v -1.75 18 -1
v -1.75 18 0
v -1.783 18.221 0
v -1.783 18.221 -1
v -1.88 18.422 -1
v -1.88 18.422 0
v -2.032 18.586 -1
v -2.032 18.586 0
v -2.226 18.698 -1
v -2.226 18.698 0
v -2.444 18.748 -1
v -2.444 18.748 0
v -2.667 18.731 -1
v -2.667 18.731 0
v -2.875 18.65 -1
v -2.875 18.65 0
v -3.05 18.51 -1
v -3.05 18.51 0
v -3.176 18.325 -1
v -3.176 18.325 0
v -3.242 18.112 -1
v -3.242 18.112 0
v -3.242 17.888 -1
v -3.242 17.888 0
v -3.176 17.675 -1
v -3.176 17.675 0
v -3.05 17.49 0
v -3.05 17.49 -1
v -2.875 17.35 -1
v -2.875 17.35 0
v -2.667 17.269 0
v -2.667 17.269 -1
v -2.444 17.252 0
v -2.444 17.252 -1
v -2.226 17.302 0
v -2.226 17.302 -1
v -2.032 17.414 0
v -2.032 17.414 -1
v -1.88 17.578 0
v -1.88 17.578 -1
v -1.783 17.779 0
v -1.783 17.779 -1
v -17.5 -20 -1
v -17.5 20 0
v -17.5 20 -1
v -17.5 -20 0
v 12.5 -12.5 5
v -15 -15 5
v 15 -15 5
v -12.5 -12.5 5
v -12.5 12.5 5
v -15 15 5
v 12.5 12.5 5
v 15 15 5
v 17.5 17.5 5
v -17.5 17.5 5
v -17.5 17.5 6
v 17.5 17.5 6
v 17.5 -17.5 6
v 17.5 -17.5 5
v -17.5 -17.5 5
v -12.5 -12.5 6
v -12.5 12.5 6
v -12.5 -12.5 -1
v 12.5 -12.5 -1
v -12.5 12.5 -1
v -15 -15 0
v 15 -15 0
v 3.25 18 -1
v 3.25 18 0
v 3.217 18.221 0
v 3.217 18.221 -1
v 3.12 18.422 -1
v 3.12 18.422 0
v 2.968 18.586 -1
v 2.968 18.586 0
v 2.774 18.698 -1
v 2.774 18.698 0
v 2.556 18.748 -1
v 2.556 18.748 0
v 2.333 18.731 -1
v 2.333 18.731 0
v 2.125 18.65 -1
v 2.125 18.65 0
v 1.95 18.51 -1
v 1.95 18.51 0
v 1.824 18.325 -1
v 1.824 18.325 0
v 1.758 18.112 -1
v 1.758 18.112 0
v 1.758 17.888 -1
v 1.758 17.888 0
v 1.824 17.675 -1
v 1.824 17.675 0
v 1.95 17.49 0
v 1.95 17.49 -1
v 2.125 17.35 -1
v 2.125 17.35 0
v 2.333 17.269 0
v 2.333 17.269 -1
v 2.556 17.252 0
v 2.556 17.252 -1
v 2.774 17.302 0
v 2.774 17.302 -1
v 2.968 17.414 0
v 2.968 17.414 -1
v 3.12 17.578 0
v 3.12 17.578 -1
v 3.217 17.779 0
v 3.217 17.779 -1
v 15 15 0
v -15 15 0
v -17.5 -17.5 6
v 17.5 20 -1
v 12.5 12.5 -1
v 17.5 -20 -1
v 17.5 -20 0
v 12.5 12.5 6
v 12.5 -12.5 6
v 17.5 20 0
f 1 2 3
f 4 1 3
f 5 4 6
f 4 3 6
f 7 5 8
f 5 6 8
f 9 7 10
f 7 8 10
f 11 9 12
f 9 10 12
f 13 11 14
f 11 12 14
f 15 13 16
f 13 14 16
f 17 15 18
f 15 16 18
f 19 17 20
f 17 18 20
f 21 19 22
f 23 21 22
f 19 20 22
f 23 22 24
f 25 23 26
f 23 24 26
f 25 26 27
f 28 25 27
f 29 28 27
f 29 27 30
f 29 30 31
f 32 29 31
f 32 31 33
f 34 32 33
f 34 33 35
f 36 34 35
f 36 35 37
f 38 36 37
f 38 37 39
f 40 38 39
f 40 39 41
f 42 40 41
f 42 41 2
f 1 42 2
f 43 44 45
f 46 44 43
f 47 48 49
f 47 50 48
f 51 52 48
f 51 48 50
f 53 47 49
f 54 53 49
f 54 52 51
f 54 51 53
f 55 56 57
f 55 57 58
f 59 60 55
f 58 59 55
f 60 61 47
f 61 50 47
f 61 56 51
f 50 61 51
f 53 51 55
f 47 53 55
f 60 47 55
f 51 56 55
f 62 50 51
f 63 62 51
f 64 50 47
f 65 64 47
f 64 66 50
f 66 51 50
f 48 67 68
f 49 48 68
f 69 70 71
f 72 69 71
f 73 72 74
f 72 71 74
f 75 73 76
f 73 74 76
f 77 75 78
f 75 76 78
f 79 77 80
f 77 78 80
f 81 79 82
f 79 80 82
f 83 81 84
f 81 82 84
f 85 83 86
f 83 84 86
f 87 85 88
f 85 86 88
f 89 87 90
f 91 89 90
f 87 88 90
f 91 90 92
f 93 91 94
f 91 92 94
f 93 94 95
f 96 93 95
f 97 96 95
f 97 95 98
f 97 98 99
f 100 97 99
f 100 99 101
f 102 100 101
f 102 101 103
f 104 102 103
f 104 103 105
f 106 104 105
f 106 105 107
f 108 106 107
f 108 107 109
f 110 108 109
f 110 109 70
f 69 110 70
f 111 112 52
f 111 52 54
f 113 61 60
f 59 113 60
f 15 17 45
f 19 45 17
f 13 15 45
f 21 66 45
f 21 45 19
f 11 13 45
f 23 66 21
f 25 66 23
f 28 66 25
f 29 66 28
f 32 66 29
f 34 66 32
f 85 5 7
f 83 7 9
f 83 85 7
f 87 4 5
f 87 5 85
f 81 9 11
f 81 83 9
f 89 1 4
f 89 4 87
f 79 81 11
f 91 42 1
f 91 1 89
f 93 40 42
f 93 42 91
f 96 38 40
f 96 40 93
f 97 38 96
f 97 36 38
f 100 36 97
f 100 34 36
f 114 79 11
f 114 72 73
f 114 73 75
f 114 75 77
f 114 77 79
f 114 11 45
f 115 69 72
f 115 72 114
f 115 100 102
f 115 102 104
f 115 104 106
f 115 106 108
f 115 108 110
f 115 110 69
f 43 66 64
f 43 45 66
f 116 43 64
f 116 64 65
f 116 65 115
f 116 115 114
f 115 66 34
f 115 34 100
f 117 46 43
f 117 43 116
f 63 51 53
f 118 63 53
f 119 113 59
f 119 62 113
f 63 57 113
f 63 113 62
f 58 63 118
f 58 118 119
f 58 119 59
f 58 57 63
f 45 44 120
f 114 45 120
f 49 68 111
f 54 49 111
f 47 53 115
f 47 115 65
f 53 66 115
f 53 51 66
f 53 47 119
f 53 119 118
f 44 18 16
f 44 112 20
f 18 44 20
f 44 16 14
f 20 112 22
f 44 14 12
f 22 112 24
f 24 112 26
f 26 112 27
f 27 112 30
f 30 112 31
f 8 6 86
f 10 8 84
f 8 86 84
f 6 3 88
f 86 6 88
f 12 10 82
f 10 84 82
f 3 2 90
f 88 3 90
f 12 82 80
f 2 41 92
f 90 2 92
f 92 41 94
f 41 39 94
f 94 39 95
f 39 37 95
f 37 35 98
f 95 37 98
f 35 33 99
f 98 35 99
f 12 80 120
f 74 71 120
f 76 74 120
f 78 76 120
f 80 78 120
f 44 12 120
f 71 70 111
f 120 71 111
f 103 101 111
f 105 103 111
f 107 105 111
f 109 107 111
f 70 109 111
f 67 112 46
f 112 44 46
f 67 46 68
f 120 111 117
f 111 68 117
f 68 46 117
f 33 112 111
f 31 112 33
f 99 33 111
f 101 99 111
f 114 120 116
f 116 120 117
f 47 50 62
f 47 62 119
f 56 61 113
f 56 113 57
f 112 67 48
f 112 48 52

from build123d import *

# Parameters (mm, degrees)
F0_W     = 30
F0_H     = 30
F0_W_2   = 25
F0_H_2   = 25
F1_DEPTH = 5
F2_W     = 35
F2_H     = 35
F2_W_2   = 30
F2_H_2   = 30
F2_W_3   = 25
F2_H_3   = 25
F3_DEPTH = 1
F4_W     = 35
F4_H     = 40
F4_W_2   = 30
F4_H_2   = 30
F4_W_3   = 25
F4_H_3   = 25
F5_DEPTH = 1
F6_R     = 0.75
F7_DEPTH = 1.001


with BuildPart() as f1:
    # F0 (on Top) → F1 (new body)
    with BuildSketch(Plane.XY):
        Rectangle(F0_W, F0_H)
        Rectangle(F0_W_2, F0_H_2, mode=Mode.SUBTRACT)
    extrude(amount=F1_DEPTH)

    # F4 (on face) → F5 (join)
    with BuildSketch(Plane(origin=(0, 0, 0), x_dir=(1, 0, 0), z_dir=(0, 0, -1))):
        Rectangle(F4_W, F4_H)
        Rectangle(F4_W_2, F4_H_2, mode=Mode.SUBTRACT)
        Rectangle(F4_W_2, F4_H_2)
        Rectangle(F4_W_3, F4_H_3, mode=Mode.SUBTRACT)
    extrude(amount=F5_DEPTH)

    # F6 (on face) → F7 (cut, through all)
    with BuildSketch(Plane.XY):
        with Locations((-2.5, 18)):
            Circle(F6_R)
        with Locations((2.5, 18)):
            Circle(F6_R)
    extrude(amount=-F7_DEPTH, mode=Mode.SUBTRACT)


with BuildPart() as f3:
    # F2 (on face) → F3 (new body)
    with BuildSketch(Plane.XY.offset(5)):
        Rectangle(F2_W, F2_H)
        Rectangle(F2_W_2, F2_H_2, mode=Mode.SUBTRACT)
        Rectangle(F2_W_2, F2_H_2)
        Rectangle(F2_W_3, F2_H_3, mode=Mode.SUBTRACT)
    extrude(amount=F3_DEPTH)


solid = Compound([f1.part, f3.part])
